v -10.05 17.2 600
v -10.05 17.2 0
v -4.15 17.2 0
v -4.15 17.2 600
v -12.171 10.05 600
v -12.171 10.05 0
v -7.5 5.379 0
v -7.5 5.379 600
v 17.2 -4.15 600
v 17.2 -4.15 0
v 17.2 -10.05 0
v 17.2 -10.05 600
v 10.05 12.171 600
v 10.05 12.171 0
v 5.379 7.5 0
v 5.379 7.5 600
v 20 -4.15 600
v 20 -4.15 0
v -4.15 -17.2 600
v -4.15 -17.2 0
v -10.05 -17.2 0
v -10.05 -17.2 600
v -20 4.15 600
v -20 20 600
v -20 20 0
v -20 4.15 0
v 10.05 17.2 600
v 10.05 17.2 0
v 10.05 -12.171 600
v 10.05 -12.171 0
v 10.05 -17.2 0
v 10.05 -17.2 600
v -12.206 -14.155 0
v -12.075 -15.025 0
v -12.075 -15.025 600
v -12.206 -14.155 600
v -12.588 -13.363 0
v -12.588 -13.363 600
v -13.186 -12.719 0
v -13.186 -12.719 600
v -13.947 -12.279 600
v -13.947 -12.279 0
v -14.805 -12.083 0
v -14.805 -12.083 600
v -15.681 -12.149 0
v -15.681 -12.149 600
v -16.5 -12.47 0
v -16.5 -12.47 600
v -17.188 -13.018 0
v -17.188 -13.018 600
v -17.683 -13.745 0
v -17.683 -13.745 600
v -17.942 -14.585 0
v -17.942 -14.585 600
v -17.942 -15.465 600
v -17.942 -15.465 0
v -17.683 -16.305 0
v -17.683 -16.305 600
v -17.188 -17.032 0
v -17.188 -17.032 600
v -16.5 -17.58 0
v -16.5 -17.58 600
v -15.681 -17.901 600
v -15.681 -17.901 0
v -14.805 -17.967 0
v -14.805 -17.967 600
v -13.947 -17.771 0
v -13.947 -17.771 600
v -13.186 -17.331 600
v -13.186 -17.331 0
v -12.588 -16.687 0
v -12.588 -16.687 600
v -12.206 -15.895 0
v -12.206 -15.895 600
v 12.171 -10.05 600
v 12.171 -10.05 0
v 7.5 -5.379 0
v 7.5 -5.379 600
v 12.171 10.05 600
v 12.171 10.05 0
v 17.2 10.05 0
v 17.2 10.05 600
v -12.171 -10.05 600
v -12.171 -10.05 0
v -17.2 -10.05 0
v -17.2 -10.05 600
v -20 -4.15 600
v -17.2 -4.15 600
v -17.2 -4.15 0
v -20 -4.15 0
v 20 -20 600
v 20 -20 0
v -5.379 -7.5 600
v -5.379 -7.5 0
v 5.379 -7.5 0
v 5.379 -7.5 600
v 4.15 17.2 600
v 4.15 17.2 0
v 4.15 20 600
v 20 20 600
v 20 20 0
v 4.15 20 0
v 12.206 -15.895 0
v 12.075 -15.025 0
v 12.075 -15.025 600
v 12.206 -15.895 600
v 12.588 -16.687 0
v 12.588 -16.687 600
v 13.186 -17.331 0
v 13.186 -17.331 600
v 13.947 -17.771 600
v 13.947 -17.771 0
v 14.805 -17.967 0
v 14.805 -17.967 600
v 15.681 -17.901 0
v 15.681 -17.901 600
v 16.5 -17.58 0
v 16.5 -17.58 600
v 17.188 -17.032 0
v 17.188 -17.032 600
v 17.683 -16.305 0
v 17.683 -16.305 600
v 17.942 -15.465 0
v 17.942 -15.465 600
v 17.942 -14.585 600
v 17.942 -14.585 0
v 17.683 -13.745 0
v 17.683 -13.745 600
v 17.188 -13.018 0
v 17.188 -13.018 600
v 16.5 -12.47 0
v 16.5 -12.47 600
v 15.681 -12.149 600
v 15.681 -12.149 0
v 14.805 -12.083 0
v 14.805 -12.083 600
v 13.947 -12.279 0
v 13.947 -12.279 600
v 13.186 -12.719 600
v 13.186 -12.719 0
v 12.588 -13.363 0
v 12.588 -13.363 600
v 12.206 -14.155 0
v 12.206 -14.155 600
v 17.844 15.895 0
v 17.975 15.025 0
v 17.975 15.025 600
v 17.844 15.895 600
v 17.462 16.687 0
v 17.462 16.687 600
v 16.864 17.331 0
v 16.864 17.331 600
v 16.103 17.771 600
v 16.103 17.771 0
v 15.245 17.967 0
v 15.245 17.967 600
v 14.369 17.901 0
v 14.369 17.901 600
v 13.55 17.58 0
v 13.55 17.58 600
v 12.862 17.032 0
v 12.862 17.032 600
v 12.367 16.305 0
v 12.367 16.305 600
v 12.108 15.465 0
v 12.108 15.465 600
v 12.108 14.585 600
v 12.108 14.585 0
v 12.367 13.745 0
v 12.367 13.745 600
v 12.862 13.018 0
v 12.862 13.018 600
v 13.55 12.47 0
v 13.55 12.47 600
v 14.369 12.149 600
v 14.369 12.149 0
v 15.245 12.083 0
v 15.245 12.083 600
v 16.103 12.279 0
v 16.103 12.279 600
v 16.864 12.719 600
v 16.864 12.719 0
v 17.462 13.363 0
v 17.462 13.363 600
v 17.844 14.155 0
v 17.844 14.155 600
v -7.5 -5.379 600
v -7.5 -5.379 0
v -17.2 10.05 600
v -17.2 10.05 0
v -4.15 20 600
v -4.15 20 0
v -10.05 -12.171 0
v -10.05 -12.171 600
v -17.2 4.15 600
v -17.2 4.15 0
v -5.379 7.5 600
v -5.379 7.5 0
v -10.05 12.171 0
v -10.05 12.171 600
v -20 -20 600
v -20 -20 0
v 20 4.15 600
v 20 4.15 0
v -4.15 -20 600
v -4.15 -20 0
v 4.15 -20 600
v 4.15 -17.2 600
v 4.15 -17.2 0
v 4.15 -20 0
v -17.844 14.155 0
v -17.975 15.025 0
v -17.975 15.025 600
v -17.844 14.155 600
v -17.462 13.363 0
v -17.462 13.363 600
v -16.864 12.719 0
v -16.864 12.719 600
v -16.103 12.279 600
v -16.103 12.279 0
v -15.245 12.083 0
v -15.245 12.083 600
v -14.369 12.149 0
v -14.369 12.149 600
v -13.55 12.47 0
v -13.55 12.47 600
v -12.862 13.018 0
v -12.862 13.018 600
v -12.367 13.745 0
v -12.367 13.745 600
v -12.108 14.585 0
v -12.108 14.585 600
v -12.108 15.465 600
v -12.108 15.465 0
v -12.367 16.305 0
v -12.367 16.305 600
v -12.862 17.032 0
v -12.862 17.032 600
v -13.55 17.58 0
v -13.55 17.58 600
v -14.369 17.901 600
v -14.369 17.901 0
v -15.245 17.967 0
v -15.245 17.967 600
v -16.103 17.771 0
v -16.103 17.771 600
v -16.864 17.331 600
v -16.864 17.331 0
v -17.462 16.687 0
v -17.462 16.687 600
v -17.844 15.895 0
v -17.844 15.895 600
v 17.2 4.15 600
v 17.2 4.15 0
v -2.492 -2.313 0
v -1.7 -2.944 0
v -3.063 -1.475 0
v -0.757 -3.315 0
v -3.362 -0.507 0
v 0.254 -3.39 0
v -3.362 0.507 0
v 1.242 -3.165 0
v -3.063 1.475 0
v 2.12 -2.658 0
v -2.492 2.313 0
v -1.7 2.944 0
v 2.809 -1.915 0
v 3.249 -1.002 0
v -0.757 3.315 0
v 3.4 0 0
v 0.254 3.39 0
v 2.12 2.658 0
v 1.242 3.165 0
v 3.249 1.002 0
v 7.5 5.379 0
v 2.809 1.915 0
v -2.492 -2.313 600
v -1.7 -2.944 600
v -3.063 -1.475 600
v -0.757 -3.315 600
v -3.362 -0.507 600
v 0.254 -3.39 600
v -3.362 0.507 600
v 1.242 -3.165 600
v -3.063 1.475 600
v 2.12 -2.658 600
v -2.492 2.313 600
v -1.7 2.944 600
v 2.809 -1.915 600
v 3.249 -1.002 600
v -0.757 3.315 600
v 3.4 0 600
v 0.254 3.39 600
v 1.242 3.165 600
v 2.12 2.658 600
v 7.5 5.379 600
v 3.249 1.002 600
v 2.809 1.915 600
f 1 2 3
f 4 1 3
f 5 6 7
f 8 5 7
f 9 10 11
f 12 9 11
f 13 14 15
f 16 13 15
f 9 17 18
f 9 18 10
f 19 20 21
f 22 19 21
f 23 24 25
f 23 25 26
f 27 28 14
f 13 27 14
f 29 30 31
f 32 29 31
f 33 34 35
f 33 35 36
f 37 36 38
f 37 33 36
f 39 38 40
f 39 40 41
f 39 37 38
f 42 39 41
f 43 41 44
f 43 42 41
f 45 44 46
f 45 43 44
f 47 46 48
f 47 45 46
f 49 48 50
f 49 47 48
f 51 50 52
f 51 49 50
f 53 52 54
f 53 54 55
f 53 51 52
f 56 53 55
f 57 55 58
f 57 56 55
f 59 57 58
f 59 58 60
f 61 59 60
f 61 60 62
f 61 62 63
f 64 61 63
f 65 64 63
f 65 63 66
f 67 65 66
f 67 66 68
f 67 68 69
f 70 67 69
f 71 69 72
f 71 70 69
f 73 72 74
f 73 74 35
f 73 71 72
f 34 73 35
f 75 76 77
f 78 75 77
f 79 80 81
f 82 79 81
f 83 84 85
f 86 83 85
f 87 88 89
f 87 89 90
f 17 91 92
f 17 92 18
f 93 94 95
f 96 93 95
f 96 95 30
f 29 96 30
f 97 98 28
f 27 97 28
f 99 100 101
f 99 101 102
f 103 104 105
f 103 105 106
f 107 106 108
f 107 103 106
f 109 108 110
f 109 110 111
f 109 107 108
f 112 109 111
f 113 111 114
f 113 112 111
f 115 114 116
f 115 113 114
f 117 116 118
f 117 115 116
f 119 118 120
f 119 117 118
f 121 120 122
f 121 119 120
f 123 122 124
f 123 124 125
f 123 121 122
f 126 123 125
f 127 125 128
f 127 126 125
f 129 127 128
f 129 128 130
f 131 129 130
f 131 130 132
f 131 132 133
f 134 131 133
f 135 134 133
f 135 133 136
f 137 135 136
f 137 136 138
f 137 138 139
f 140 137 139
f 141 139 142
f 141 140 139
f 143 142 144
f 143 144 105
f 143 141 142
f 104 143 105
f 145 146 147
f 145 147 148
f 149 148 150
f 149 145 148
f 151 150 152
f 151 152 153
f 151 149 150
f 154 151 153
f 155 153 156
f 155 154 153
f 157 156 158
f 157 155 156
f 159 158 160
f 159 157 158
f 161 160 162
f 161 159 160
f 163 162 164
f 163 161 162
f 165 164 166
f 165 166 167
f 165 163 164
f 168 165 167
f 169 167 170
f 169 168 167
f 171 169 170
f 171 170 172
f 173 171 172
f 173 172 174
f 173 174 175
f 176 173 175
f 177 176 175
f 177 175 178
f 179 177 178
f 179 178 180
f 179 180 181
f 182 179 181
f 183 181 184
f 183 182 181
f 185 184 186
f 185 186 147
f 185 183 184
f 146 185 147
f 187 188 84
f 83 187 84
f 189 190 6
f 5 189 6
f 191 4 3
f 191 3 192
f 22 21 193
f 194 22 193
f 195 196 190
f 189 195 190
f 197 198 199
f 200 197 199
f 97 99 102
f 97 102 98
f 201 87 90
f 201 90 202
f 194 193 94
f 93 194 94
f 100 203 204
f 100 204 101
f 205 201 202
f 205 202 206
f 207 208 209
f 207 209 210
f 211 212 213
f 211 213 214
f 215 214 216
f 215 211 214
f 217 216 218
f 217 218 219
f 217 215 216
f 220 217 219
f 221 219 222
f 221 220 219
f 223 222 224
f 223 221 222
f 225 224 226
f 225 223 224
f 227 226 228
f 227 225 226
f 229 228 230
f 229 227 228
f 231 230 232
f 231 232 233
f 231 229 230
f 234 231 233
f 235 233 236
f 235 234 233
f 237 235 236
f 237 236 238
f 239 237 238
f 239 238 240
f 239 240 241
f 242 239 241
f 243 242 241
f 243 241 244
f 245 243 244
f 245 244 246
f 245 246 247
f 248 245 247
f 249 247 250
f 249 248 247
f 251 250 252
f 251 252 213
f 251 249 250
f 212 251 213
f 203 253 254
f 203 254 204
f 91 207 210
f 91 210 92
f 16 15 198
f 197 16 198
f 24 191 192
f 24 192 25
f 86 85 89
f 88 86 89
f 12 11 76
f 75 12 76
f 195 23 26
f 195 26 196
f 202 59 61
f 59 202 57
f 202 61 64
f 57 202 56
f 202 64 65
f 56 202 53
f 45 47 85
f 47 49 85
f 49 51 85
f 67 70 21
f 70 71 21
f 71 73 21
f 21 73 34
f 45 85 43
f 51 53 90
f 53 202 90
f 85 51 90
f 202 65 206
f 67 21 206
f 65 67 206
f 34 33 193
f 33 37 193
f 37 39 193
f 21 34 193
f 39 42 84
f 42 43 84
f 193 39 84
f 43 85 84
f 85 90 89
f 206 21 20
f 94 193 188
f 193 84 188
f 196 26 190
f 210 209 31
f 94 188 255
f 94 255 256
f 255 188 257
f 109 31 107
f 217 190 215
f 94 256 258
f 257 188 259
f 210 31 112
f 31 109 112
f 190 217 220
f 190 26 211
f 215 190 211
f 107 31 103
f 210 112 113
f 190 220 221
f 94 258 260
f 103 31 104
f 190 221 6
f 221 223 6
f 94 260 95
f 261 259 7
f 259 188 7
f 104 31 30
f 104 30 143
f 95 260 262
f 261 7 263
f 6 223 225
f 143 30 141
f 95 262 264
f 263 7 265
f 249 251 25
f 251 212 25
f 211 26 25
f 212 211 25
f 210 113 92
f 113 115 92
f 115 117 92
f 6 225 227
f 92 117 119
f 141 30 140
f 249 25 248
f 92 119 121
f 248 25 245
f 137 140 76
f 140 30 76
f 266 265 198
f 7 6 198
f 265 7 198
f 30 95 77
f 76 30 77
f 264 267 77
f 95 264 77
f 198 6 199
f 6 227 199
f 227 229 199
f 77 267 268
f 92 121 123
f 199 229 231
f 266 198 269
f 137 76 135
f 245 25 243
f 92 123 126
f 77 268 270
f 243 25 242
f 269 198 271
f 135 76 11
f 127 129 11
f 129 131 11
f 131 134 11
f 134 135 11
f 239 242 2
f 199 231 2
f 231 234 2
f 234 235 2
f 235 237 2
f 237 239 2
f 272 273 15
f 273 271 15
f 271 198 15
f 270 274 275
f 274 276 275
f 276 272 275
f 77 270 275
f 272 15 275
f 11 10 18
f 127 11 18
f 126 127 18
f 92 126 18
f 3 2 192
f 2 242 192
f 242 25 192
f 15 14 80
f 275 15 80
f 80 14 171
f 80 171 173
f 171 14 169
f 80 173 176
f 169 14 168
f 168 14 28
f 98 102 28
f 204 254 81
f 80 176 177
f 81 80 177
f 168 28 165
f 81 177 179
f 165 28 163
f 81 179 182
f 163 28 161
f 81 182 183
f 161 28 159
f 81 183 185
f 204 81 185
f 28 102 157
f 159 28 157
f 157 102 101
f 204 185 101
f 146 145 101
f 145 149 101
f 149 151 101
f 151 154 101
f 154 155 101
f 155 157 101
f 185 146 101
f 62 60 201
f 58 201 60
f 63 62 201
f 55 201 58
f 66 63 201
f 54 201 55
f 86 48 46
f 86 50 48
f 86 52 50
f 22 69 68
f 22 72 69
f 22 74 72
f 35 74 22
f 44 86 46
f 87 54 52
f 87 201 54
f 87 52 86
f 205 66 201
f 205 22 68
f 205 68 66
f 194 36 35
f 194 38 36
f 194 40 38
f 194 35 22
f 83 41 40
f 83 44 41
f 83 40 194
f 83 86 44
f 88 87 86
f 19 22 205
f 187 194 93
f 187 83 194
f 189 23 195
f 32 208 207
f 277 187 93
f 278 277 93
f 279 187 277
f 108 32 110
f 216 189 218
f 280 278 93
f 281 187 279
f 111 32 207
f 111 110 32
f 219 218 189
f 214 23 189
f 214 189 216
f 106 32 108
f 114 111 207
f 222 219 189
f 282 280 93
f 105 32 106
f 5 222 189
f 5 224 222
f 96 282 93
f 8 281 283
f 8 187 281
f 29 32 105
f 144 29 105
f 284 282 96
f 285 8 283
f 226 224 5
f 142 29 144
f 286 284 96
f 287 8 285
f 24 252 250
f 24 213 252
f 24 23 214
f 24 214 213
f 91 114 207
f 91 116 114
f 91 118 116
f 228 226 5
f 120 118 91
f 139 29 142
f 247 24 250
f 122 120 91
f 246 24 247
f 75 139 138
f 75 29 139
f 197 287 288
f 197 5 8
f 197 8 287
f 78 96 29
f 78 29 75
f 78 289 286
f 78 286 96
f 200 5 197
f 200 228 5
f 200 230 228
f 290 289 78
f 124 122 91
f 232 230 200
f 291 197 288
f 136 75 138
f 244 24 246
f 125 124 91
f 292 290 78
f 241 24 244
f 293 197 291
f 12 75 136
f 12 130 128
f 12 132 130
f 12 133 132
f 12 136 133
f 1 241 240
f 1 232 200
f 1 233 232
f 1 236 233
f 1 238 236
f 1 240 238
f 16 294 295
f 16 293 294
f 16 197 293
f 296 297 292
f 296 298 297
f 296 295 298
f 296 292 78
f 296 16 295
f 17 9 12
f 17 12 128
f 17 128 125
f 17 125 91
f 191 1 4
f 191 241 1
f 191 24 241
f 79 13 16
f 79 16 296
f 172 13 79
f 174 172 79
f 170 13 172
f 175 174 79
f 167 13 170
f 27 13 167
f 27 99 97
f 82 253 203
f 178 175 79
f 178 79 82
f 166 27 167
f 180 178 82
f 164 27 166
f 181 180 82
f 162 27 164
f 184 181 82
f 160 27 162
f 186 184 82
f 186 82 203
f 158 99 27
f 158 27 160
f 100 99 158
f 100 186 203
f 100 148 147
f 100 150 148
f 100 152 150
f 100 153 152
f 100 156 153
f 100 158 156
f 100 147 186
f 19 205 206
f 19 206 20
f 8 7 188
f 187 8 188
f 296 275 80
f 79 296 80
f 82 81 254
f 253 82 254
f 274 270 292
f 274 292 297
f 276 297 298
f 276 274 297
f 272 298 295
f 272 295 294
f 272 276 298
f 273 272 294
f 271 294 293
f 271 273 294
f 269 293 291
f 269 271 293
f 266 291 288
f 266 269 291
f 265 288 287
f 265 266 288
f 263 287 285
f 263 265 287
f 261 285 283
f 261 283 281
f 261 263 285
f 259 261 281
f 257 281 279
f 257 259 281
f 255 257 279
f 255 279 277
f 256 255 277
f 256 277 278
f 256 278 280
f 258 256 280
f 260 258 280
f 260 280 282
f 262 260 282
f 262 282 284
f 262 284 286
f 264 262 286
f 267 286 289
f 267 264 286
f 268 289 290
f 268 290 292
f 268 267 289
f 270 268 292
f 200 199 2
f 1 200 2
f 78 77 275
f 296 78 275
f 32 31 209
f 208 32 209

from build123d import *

# Parameters (mm, degrees)
SKETCH_1_R      = 3.4
SKETCH_1_R_2    = 2.95
EXTRUDE_1_DEPTH = 600


with BuildPart() as part:
    # 草图1 → 凸台-拉伸1 (new body)
    with BuildSketch(Plane.XY):
        Polygon((-5.378679656, -7.5), (5.378679656, -7.5), (10.05, -12.171320344), (10.05, -17.2), (4.15, -17.2), (4.15, -20), (20, -20), (20, -4.15), (17.2, -4.15), (17.2, -10.05), (12.171320344, -10.05), (7.5, -5.378679656), (7.5, 5.378679656), (12.171320344, 10.05), (17.2, 10.05), (17.2, 4.15), (20, 4.15), (20, 20), (4.15, 20), (4.15, 17.2), (10.05, 17.2), (10.05, 12.171320344), (5.378679656, 7.5), (-5.378679656, 7.5), (-10.05, 12.171320344), (-10.05, 17.2), (-4.15, 17.2), (-4.15, 20), (-20, 20), (-20, 4.15), (-17.2, 4.15), (-17.2, 10.05), (-12.171320344, 10.05), (-7.5, 5.378679656), (-7.5, -5.378679656), (-12.171320344, -10.05), (-17.2, -10.05), (-17.2, -4.15), (-20, -4.15), (-20, -20), (-4.15, -20), (-4.15, -17.2), (-10.05, -17.2), (-10.05, -12.171320344), align=None)
        Circle(SKETCH_1_R, mode=Mode.SUBTRACT)
        with Locations((15.025, 15.025)):
            Circle(SKETCH_1_R_2, mode=Mode.SUBTRACT)
        with Locations(Location((-15.025, 15.025, 0), (0, 0, 180))):
            Circle(SKETCH_1_R_2, mode=Mode.SUBTRACT)
        with Locations((-15.025, -15.025)):
            Circle(SKETCH_1_R_2, mode=Mode.SUBTRACT)
        with Locations(Location((15.025, -15.025, 0), (0, 0, 180))):
            Circle(SKETCH_1_R_2, mode=Mode.SUBTRACT)
    extrude(amount=EXTRUDE_1_DEPTH)


solid = part.part
